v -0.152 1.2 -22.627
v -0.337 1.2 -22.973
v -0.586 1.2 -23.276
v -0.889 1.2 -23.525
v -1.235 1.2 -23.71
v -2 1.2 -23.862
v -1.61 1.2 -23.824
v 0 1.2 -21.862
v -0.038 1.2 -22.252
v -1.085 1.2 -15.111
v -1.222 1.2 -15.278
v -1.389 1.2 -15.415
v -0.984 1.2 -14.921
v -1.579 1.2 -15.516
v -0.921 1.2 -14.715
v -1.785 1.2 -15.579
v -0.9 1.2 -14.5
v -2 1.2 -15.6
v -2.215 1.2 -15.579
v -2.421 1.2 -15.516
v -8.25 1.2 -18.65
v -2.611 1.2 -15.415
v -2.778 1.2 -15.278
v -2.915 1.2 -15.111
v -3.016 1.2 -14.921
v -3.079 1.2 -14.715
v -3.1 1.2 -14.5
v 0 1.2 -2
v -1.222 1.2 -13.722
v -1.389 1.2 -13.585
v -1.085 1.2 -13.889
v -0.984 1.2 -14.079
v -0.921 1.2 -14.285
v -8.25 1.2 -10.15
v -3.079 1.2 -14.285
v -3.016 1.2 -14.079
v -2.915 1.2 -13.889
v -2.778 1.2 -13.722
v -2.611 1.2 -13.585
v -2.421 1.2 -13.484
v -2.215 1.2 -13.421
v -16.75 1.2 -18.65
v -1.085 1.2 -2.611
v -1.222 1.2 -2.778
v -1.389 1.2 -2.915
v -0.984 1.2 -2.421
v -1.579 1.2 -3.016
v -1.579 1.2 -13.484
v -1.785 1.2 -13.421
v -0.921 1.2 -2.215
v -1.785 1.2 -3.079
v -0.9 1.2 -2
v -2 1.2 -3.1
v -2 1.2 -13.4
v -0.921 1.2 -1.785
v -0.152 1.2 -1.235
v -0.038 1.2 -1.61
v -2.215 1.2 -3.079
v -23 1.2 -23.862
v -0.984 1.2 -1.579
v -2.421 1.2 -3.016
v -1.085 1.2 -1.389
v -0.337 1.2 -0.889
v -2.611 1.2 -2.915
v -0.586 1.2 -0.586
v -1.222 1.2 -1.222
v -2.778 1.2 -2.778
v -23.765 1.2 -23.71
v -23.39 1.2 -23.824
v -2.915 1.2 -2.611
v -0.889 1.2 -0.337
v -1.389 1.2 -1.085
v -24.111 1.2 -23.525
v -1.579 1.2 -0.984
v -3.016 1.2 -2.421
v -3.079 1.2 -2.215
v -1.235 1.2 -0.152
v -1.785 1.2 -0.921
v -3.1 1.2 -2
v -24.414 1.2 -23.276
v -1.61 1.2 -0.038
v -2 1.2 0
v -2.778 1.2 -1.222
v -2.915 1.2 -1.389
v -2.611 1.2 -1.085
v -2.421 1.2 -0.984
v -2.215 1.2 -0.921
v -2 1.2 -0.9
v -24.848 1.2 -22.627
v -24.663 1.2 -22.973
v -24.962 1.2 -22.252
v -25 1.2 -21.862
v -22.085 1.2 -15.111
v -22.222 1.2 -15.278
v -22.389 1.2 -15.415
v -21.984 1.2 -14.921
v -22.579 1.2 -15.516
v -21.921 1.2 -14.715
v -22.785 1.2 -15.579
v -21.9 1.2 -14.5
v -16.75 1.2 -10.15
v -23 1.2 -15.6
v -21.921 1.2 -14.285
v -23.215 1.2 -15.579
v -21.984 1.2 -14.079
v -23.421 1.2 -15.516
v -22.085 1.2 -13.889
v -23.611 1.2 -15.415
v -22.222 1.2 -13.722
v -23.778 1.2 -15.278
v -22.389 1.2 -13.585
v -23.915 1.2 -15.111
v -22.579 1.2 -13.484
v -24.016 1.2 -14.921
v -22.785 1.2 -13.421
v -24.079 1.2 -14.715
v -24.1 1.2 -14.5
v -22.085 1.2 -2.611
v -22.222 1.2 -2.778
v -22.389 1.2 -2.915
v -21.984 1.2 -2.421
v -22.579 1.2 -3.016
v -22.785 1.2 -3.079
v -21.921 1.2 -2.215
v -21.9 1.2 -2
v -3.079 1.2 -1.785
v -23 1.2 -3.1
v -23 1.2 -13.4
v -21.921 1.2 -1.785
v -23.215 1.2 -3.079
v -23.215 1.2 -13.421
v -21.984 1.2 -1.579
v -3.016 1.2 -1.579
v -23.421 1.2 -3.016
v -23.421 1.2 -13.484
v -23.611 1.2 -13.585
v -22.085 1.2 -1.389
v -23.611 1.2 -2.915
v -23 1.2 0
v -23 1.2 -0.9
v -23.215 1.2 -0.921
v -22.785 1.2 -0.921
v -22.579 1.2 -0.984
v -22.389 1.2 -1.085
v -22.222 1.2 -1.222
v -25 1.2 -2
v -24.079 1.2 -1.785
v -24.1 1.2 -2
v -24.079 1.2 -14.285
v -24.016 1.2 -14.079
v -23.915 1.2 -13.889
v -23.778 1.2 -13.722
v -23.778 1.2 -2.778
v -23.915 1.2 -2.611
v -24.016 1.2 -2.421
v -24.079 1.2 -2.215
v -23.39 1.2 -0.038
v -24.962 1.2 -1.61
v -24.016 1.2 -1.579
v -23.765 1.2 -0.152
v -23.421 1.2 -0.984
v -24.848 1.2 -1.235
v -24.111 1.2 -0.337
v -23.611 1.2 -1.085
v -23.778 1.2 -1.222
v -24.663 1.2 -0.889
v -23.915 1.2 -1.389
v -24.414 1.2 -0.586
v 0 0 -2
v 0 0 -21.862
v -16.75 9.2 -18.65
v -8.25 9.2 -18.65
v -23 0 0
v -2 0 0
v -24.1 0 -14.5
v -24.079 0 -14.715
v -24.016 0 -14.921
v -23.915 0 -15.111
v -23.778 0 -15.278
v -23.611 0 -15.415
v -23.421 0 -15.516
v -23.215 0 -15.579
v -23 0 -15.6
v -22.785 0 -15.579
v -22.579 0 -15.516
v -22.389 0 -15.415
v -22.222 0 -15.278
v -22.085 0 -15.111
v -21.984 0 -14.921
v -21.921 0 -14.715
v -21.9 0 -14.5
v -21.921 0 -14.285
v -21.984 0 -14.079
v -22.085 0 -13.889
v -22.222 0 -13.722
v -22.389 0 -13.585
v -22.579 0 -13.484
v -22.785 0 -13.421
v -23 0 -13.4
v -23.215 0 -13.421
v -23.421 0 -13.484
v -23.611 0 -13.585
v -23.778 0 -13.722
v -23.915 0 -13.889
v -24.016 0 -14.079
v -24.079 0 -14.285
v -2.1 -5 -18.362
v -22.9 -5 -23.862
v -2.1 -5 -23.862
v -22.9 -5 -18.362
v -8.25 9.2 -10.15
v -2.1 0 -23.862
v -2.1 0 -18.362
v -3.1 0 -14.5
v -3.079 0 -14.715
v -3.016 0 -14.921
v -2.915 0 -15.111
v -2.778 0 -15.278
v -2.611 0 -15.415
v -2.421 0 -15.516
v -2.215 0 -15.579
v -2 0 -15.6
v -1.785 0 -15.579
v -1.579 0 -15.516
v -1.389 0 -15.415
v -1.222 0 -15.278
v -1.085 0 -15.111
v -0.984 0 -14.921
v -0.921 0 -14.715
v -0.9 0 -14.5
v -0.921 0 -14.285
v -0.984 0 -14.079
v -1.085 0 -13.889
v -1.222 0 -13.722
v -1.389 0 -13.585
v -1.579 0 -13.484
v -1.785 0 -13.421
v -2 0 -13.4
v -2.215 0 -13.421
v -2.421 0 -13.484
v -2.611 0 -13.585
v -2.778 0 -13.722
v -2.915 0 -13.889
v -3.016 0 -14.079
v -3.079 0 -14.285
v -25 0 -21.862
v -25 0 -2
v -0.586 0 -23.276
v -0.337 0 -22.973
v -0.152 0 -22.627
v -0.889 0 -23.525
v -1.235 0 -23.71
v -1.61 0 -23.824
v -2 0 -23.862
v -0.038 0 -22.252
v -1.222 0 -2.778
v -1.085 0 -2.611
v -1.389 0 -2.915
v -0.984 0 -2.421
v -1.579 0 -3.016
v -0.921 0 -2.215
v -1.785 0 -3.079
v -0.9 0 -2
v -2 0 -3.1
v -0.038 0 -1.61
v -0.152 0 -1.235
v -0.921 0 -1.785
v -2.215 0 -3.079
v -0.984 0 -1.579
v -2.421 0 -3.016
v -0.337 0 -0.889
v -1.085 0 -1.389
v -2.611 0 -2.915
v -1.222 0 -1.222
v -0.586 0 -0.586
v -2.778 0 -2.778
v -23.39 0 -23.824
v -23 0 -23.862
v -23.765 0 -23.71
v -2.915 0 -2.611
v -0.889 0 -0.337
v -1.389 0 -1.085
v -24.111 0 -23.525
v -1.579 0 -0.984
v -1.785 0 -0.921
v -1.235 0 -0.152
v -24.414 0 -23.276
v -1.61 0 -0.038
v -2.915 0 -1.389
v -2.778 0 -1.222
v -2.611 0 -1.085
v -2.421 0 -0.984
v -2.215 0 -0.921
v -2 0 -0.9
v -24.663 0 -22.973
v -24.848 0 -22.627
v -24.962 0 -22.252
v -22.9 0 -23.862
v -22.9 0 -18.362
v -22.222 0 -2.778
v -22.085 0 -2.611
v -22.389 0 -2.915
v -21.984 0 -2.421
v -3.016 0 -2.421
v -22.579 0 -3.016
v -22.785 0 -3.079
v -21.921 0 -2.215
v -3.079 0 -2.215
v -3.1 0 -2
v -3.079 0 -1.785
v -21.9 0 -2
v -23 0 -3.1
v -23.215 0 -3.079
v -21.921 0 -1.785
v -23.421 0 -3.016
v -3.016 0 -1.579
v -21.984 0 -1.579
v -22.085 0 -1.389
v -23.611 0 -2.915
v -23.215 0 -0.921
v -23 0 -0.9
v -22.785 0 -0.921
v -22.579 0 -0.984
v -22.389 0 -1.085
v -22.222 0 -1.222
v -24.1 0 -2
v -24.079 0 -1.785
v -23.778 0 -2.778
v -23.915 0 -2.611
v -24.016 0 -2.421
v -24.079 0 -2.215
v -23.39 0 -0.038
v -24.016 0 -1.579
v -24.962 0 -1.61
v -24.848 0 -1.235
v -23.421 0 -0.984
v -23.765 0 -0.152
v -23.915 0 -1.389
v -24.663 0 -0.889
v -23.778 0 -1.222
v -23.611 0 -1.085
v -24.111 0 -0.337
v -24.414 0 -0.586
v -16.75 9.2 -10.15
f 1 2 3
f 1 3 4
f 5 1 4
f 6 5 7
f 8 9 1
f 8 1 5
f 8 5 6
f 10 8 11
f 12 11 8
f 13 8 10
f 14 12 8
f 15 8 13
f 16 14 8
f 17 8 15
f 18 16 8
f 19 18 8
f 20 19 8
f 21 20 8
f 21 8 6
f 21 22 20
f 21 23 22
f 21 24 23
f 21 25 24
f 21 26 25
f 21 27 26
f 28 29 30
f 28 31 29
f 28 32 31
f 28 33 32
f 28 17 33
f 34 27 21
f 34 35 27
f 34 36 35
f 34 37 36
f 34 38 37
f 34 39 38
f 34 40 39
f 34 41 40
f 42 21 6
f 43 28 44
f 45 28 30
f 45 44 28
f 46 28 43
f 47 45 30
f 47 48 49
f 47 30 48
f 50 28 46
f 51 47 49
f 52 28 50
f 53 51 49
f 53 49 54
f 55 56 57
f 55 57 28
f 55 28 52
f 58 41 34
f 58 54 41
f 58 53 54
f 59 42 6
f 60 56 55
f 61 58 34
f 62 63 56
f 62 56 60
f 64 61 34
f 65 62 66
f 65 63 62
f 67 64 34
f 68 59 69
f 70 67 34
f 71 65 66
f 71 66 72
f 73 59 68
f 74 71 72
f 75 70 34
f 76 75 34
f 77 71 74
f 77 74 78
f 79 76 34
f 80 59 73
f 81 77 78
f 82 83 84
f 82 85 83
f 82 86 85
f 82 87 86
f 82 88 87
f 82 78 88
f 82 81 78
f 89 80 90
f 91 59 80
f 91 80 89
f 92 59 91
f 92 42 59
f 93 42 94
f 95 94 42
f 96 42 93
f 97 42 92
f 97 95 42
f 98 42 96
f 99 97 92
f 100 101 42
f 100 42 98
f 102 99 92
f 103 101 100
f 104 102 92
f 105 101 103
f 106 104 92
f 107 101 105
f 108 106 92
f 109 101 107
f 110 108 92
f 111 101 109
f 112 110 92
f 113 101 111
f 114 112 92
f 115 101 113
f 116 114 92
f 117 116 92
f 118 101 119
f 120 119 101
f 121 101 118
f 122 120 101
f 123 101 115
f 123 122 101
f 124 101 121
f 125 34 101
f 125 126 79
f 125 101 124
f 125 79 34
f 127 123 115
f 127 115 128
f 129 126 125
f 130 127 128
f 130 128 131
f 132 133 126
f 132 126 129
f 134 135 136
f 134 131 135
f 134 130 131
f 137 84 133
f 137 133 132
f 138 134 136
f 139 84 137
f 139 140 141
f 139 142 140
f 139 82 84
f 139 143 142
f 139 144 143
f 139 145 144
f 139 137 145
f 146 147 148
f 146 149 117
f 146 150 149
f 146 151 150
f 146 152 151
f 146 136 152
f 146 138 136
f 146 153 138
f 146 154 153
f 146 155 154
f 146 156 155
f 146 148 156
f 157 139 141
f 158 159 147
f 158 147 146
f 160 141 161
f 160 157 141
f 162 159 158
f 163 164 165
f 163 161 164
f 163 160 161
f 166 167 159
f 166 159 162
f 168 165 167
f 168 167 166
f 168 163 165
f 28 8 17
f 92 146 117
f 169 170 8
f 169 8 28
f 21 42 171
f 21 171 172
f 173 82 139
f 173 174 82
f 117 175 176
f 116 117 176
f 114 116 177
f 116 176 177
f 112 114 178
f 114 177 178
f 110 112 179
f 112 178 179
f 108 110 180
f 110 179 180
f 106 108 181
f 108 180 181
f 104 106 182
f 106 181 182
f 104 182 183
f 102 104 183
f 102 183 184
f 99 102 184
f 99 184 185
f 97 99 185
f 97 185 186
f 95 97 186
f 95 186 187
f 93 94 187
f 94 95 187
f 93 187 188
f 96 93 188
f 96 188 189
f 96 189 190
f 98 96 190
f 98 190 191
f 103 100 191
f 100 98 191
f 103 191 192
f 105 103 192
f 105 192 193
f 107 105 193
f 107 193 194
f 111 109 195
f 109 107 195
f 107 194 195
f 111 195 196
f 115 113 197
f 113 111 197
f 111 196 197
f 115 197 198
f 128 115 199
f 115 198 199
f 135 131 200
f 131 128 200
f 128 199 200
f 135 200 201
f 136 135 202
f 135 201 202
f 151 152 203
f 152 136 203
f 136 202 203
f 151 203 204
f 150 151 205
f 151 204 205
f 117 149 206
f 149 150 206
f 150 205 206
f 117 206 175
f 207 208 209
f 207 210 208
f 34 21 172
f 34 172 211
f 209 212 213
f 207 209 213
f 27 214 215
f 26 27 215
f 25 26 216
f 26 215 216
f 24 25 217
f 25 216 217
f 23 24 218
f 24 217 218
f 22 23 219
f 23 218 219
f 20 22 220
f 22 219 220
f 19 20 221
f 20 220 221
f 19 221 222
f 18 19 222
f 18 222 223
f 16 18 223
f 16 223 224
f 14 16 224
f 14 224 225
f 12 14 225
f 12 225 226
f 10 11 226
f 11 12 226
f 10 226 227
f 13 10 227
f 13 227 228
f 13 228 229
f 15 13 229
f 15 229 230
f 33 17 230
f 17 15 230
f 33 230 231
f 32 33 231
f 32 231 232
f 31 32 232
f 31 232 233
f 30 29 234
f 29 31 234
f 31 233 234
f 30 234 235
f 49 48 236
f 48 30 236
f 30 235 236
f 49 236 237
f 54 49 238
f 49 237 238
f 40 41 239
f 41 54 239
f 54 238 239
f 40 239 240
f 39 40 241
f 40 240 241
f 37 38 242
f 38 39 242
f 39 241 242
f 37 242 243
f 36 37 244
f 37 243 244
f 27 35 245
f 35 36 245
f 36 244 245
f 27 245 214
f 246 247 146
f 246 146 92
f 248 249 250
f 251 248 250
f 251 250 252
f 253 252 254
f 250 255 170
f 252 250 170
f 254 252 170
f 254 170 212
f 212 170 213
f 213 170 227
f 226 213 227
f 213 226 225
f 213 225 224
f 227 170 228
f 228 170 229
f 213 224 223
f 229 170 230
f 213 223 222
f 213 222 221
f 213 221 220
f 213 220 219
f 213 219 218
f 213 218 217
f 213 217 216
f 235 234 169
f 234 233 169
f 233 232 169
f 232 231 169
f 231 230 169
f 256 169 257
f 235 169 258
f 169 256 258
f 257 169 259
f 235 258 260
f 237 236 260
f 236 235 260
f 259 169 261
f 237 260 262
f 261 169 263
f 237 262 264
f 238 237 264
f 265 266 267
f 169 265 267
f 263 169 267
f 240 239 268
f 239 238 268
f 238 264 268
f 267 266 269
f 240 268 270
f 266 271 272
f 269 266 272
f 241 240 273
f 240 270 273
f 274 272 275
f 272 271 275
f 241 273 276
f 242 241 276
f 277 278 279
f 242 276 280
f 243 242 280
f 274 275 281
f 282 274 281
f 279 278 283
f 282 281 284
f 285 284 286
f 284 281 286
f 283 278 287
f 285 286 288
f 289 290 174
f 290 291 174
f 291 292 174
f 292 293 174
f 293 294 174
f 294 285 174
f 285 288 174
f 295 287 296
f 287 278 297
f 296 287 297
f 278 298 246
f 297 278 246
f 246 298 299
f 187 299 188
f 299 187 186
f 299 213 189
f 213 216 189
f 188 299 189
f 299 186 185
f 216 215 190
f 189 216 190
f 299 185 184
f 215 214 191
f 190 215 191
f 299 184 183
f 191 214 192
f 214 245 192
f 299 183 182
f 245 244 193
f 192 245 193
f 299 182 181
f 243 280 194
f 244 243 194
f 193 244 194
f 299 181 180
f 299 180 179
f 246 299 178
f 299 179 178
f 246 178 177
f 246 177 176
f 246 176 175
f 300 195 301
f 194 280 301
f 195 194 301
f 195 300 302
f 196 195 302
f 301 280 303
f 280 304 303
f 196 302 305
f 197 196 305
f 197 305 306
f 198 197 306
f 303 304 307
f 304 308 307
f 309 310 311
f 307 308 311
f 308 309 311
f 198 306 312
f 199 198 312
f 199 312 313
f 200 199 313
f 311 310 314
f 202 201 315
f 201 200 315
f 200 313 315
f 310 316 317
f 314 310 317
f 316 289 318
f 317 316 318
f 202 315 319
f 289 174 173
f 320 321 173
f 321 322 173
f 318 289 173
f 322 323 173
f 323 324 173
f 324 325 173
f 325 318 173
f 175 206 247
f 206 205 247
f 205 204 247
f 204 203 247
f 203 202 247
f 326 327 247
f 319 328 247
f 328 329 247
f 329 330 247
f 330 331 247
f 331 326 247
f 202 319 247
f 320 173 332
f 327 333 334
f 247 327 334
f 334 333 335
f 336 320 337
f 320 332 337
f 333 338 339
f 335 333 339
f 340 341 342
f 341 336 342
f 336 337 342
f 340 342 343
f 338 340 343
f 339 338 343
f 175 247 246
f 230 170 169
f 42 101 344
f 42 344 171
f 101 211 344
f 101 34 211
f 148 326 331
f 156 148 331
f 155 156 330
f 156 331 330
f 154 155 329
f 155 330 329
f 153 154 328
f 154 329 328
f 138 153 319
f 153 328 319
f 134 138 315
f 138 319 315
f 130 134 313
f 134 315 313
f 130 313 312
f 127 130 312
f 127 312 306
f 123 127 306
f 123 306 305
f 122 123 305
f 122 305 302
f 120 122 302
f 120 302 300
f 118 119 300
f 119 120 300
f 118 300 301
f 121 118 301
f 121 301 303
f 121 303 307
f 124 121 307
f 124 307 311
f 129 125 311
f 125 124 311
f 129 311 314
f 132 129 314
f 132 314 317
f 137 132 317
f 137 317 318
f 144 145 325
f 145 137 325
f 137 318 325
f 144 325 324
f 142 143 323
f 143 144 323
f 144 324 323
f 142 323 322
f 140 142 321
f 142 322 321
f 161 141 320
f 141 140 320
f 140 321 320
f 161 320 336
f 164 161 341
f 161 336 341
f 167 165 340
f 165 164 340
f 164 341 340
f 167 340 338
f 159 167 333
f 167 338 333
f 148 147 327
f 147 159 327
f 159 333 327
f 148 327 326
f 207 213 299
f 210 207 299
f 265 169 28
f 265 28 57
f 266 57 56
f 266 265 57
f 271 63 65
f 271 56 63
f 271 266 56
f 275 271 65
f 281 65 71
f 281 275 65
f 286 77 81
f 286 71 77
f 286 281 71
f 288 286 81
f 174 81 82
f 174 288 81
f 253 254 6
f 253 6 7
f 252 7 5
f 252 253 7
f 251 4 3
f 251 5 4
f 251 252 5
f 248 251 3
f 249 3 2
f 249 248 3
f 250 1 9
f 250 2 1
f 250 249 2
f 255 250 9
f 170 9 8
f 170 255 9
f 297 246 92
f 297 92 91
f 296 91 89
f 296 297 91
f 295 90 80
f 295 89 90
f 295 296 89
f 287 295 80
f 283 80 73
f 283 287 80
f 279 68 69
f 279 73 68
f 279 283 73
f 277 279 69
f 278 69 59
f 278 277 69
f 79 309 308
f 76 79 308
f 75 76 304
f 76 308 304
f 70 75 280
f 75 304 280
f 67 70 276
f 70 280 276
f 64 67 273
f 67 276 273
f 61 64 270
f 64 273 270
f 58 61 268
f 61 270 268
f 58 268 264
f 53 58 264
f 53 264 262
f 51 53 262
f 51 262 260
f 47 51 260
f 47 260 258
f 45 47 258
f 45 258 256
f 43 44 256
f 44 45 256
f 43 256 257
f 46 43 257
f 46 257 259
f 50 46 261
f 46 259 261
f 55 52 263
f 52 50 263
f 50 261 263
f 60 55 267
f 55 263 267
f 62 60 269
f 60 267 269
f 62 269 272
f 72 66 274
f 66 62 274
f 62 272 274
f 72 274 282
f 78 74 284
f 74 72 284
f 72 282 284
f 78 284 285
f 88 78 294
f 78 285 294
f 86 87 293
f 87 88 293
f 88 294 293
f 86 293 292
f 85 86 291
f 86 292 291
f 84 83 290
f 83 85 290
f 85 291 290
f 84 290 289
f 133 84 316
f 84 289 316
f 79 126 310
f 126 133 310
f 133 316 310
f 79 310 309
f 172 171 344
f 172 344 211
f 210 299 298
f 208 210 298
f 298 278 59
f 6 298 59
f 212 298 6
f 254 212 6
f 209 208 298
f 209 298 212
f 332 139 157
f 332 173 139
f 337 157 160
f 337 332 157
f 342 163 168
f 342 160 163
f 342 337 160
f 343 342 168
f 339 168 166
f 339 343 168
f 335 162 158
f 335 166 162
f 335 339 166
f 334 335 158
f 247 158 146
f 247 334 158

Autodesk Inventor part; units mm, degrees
ref_plane "YZ Plane" through (0, 0, 0) normal (1, 0, 0) x (0, 1, 0)
ref_plane "XZ Plane" through (0, 0, 0) normal (0, 1, 0) x (-1, 0, 0)
ref_plane "XY Plane" through (0, 0, 0) normal (0, 0, 1) x (1, 0, 0)
sketch "Sketch1" plane through (0, 0, 0) normal (0, 1, 0) x (-1, 0, 0)
  line L0 (2, 0) -> (23, 0)
  line L1 (25, -2) -> (25, -21.862)
  line L2 (23, -23.862) -> (2, -23.862)
  line L3 (0, -21.862) -> (0, -2)
  arc A0 (25, -2) -> (23, 0) centre (23, -2) ccw
  arc A1 (23, -23.862) -> (25, -21.862) centre (23, -21.862) ccw
  arc A2 (0, -21.862) -> (2, -23.862) centre (2, -21.862) ccw
  arc A3 (2, 0) -> (0, -2) centre (2, -2) ccw
  line L4 (23, 0) -> (23, -23.862) construction
  line L5 (2, -23.862) -> (2, 0) construction
  line L6 (25, -2) -> (0, -2) construction
  line L7 (0, -14.5) -> (25, -14.5) construction
  circle A4 centre (23, -2) radius 1.1
  circle A5 centre (23, -14.5) radius 1.1
  circle A6 centre (2, -14.5) radius 1.1
  circle A7 centre (2, -2) radius 1.1
  point P0 (0, 0)
  point P1 (25, -23.862)
  point P2 (25, 0)
  point P3 (0, -23.862)
  dimension "d0" = 25
  dimension "d1" = 23.862
  dimension "d2" = 2
  dimension "d3" = 2
  dimension "d4" = 14.5
  dimension "d5" = 2
  dimension "d6" = 2
  dimension "d7" = 2.2
  dimension "d8" = 2.2
  dimension "d9" = 2.2
  dimension "d10" = 2.2
extrude "Extrusion1" add sketch "Sketch1" along normal blind 1.2
sketch "Sketch2" plane through (0, 1.2, 0) normal (0, 1, 0) x (1, 0, 0)
  line L0 (-25, 21.862) -> (-25, 2) construction
  line L1 (-25, 11.931) -> (0, 11.931) construction
  line L2 (0, 2) -> (0, 21.862) construction
  line L3 (-2, 23.862) -> (-23, 23.862) construction
  line L4 (-12.5, 23.862) -> (-12.5, 0) construction
  line L5 (-23, 0) -> (-2, 0) construction
  line L6 (-16.75, 18.65) -> (-8.25, 18.65)
  line L7 (-8.25, 18.65) -> (-8.25, 10.15)
  line L8 (-8.25, 10.15) -> (-16.75, 10.15)
  line L9 (-16.75, 10.15) -> (-16.75, 18.65)
  line L10 (-16.75, 14.4) -> (-8.25, 14.4) construction
  line L11 (-12.5, 18.65) -> (-12.5, 10.15) construction
  point P0 (0, 0)
  point P1 (-12.5, 14.4)
  dimension "d13" = 8.5
  dimension "d14" = 8.5
  dimension "d15" = 12.5
  dimension "d16" = 9.462
extrude "Extrusion2" add sketch "Sketch2" along normal blind 8
sketch "Sketch3" plane through (0, 0, 0) normal (0, -1, 0) x (1, 0, 0)
  line L0 (-2, -23.862) -> (-23, -23.862) projected
  line L1 (-22.9, -23.862) -> (-2.1, -23.862)
  line L2 (-2.1, -23.862) -> (-2.1, -18.362)
  line L3 (-2.1, -18.362) -> (-22.9, -18.362)
  line L4 (-22.9, -18.362) -> (-22.9, -23.862)
  line L5 (-12.5, -18.362) -> (-12.5, -23.862) construction
  point P0 (0, 0)
  dimension "d19" = 20.8
  dimension "d20" = 5.5
extrude "Extrusion3" add sketch "Sketch3" along normal blind 5
equation "\"d6\" = d5"
equation "\"d7\" = d8"
equation "\"d9\" = d8"
equation "\"d10\" = d8"
properties part number "RaspberryPiCamera"
